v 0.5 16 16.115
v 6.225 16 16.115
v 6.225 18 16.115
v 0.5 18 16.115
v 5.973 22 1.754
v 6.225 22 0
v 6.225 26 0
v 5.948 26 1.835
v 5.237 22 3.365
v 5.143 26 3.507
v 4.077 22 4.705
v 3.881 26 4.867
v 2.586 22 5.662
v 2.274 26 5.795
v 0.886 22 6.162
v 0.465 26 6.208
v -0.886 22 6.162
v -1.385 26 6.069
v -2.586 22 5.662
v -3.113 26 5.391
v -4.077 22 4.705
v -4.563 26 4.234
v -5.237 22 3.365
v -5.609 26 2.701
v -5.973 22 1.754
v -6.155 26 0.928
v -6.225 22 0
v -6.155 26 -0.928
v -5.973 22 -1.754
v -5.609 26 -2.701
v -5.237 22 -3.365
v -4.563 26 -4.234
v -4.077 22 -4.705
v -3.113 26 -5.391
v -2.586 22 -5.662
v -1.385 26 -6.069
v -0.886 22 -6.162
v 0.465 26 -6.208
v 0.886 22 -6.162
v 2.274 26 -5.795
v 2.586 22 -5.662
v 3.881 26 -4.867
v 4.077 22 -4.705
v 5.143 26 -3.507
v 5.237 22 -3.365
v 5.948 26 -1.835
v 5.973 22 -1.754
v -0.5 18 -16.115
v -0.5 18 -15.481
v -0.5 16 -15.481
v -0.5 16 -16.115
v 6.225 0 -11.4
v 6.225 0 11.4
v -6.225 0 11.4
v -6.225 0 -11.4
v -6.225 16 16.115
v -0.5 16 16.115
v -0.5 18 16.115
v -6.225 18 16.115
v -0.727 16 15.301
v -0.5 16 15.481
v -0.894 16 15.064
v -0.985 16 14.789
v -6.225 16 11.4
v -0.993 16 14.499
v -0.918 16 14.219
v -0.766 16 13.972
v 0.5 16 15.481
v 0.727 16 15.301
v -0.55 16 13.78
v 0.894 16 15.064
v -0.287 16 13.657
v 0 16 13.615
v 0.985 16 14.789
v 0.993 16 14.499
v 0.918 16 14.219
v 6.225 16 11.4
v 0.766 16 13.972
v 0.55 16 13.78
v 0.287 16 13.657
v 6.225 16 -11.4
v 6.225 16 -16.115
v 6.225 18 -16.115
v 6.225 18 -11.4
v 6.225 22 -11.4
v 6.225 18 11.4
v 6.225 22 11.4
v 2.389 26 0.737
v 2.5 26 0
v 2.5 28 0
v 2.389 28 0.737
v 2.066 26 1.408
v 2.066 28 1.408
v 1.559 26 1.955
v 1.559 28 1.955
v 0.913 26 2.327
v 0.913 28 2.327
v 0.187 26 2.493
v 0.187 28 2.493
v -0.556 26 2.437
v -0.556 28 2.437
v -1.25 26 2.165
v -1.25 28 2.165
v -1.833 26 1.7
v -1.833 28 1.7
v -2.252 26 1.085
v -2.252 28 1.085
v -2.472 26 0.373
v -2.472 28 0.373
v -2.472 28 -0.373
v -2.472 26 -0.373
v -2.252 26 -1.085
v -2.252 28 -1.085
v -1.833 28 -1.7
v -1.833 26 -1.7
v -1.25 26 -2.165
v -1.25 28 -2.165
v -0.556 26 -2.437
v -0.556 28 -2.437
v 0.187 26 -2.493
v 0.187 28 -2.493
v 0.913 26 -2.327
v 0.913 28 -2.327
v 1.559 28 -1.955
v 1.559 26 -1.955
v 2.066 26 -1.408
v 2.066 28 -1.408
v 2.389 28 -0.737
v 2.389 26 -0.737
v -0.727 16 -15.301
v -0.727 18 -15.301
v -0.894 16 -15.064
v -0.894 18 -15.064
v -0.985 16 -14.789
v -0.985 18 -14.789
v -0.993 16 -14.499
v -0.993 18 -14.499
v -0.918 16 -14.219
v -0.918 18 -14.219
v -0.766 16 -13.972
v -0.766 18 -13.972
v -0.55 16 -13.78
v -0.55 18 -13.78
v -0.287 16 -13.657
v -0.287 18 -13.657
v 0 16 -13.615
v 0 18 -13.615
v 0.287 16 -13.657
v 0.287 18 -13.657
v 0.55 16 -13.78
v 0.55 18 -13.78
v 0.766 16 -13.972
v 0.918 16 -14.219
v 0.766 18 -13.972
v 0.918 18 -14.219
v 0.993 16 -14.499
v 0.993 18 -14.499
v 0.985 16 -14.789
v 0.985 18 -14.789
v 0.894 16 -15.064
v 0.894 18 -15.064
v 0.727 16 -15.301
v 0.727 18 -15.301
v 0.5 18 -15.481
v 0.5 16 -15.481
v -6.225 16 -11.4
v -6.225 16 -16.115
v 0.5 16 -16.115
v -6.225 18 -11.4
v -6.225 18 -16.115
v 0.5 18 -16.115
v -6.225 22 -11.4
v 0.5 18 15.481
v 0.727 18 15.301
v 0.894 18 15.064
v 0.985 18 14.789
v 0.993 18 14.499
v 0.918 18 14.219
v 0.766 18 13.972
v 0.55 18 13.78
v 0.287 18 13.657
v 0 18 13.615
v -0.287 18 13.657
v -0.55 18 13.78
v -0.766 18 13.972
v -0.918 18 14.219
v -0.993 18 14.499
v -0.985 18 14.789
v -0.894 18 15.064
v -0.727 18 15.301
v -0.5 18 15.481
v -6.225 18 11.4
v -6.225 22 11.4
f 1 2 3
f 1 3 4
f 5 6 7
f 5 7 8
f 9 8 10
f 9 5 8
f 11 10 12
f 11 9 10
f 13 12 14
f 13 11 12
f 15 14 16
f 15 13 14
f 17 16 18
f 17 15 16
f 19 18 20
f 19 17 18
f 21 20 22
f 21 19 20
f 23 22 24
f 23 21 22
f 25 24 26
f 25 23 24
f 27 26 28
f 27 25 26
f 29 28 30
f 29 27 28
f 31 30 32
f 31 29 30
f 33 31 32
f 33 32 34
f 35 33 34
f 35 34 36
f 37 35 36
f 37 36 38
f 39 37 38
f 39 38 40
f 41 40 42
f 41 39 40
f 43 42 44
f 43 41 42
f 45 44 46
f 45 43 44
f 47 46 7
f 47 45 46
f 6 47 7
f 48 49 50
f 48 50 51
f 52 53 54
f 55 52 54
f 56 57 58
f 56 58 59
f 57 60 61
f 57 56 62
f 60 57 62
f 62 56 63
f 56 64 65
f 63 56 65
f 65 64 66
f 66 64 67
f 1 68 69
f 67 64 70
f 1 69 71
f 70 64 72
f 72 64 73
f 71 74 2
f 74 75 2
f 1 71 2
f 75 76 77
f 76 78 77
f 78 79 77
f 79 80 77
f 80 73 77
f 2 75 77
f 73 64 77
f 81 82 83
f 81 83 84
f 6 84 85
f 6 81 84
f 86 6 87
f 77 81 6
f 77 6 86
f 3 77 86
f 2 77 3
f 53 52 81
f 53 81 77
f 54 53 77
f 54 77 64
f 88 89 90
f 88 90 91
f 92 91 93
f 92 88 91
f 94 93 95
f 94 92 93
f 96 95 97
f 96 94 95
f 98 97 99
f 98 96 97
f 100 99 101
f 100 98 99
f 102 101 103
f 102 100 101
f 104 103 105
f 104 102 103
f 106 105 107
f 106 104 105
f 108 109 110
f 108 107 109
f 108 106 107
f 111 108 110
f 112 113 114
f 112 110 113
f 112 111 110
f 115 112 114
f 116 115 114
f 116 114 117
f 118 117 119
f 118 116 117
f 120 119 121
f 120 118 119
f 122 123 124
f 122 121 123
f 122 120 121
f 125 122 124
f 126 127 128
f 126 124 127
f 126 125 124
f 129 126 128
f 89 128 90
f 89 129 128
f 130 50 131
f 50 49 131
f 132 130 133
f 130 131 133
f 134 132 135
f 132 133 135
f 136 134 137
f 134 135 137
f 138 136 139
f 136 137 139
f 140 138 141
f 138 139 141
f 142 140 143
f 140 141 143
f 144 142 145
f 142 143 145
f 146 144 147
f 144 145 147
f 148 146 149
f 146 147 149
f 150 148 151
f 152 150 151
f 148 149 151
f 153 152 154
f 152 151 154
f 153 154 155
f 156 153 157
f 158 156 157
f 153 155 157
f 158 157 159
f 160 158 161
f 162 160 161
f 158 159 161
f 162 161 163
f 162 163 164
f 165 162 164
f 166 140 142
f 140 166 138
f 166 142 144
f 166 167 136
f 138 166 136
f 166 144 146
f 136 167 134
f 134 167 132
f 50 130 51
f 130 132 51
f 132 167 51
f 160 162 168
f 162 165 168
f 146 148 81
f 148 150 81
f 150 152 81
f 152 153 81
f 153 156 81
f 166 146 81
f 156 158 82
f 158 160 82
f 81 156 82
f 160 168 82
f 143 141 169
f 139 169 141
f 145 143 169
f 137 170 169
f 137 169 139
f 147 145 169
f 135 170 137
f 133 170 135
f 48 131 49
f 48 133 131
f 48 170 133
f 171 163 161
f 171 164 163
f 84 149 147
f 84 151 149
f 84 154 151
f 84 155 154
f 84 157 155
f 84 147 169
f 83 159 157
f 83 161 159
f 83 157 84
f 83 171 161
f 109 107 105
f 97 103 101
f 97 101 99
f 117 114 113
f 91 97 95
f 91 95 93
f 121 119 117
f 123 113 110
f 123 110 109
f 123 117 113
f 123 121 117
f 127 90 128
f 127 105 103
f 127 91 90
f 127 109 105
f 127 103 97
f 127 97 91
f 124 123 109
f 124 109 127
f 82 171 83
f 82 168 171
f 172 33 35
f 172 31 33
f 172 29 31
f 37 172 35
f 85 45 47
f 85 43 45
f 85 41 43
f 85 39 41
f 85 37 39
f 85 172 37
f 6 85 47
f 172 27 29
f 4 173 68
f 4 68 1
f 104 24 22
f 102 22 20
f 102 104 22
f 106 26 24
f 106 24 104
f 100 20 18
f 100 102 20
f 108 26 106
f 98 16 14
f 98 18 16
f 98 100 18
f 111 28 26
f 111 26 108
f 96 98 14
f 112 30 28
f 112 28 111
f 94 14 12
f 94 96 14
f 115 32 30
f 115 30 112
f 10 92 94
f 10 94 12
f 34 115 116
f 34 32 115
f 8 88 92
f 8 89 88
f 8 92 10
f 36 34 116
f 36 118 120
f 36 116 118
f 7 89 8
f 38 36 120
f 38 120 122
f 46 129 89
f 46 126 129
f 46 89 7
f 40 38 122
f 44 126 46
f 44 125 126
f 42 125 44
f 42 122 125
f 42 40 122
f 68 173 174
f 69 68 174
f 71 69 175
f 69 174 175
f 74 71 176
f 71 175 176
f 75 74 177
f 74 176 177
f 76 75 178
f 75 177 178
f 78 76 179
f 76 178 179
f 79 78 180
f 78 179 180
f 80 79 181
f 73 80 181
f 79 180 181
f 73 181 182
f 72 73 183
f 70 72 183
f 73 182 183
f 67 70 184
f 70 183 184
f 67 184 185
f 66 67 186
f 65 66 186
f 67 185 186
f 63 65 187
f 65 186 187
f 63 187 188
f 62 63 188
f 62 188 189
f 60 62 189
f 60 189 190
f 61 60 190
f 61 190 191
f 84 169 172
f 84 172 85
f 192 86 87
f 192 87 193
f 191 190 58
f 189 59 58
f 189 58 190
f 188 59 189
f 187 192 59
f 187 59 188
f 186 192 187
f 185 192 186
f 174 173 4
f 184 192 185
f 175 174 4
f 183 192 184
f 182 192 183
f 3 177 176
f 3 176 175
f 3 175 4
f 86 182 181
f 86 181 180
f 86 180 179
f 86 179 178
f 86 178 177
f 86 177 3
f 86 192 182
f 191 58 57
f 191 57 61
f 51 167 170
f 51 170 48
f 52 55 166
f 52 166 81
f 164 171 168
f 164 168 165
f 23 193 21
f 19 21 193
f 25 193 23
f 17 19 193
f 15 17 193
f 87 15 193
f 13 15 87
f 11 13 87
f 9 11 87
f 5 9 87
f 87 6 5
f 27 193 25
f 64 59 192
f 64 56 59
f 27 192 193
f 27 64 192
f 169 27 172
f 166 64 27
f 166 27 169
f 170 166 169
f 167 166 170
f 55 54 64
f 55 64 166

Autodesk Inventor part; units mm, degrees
ref_plane "YZ Plane" through (0, 0, 0) normal (1, 0, 0) x (0, 1, 0)
ref_plane "XZ Plane" through (0, 0, 0) normal (0, 1, 0) x (-1, 0, 0)
ref_plane "XY Plane" through (0, 0, 0) normal (0, 0, 1) x (1, 0, 0)
sketch "Sketch1" plane through (0, 0, 0) normal (0, 1, 0) x (-1, 0, 0)
  line L0 (6.225, -11.4) -> (-6.225, -11.4)
  line L1 (-6.225, -11.4) -> (-6.225, 11.4)
  line L2 (-6.225, 11.4) -> (6.225, 11.4)
  line L3 (6.225, 11.4) -> (6.225, -11.4)
  line L4 (0, 0) -> (0, -6.7915)
  line L5 (0, 0) -> (-3.4264, 0)
  point P0 (0, -11.4)
  point P1 (-6.225, 0)
  dimension "d0" = 12.45
  dimension "d1" = 22.8
extrude "Extrusion1" add sketch "Sketch1" along normal blind 16
sketch "Sketch2" plane through (0, 16, 0) normal (0, 1, 0) x (1, 0, 0)
  line L0 (-6.225, 11.4) -> (-6.225, -11.4) projected
  line L1 (6.225, -11.4) -> (6.225, 11.4) projected
  line L2 (6.225, -16.115) -> (-6.225, -16.115)
  line L3 (-6.225, -16.115) -> (-6.225, 16.115)
  line L4 (-6.225, 16.115) -> (6.225, 16.115)
  line L5 (6.225, 16.115) -> (6.225, -16.115)
  point P0 (0, 0)
  point P1 (-6.225, 0)
  point P2 (6.225, 0)
  dimension "d4" = 32.23
extrude "Extrusion2" add sketch "Sketch2" along normal blind 2
sketch "Sketch3" plane through (0, 18, 0) normal (0, 1, 0) x (1, 0, 0)
  line L0 (-6.225, 11.4) -> (6.225, 11.4) projected
  line L1 (6.225, 11.4) -> (6.225, -11.4) projected
  line L2 (6.225, -11.4) -> (-6.225, -11.4) projected
  line L3 (-6.225, -11.4) -> (-6.225, 11.4) projected
  line L4 (6.225, -16.115) -> (-6.225, -16.115) projected
  line L5 (-6.225, -16.115) -> (-6.225, 16.115) projected
  line L6 (-6.225, 16.115) -> (6.225, 16.115) projected
  line L7 (6.225, 16.115) -> (6.225, -16.115) projected
  line L8 (6.225, -16.115) -> (-6.225, -16.115) projected
  line L9 (-6.225, -16.115) -> (-6.225, 16.115) projected
  line L10 (-6.225, 16.115) -> (6.225, 16.115) projected
  line L11 (6.225, 16.115) -> (6.225, -16.115) projected
  point P0 (0, 0)
extrude "Extrusion3" add sketch "Sketch3" along normal blind 4 contours L0 L1 L2 L3
sketch "Sketch4" plane through (0, 22, 0) normal (0, 1, 0) x (1, 0, 0)
  line L0 (-6.225, 11.4) -> (-6.225, -11.4) projected
  line L1 (6.225, -11.4) -> (6.225, 11.4) projected
  circle A0 centre (0, 0) radius 6.225
  circle A1 centre (0, 0) radius 1.5
  point P0 (0, 0)
  dimension "d10" = 3
extrude "Extrusion4" add sketch "Sketch4" along normal blind 4 contours A0 | A1
sketch "Sketch5" plane through (0, 18, 0) normal (0, 1, 0) x (1, 0, 0)
  line L0 (-6.225, -16.115) -> (6.225, -16.115) projected
  line L1 (6.225, -16.115) -> (6.225, -11.4) projected
  circle A0 centre (0, -14.615) radius 1
  line L2 (0.5, -16.115) -> (-0.5, -16.115)
  line L3 (-0.5, -16.115) -> (-0.5, -15.115)
  line L4 (-0.5, -15.115) -> (0.5, -15.115)
  line L5 (0.5, -15.115) -> (0.5, -16.115)
  point P0 (0, 0)
  point P1 (0, -16.115)
  dimension "d15" = 2
  dimension "d16" = 1.5
  dimension "d17" = 1
  dimension "d18" = 1
  dimension "d19" = 6.225
extrude "Extrusion5" cut sketch "Sketch5" against normal blind 4
mirror "Mirror3" about plane through (0, 0, 0) normal (0, 0, 1) of "Extrusion5"
sketch "Sketch11" plane through (0, 26, 0) normal (0, 1, 0) x (1, 0, 0)
  arc A0 (6.225, 0) -> (6.225, 0) centre (0, 0) ccw projected
  circle A1 centre (0, 0) radius 2.5
  point P0 (0, 0)
  dimension "d49" = 5
extrude "Extrusion11" add sketch "Sketch11" along normal blind 2 contours A1
properties material "PPS Plastic"
